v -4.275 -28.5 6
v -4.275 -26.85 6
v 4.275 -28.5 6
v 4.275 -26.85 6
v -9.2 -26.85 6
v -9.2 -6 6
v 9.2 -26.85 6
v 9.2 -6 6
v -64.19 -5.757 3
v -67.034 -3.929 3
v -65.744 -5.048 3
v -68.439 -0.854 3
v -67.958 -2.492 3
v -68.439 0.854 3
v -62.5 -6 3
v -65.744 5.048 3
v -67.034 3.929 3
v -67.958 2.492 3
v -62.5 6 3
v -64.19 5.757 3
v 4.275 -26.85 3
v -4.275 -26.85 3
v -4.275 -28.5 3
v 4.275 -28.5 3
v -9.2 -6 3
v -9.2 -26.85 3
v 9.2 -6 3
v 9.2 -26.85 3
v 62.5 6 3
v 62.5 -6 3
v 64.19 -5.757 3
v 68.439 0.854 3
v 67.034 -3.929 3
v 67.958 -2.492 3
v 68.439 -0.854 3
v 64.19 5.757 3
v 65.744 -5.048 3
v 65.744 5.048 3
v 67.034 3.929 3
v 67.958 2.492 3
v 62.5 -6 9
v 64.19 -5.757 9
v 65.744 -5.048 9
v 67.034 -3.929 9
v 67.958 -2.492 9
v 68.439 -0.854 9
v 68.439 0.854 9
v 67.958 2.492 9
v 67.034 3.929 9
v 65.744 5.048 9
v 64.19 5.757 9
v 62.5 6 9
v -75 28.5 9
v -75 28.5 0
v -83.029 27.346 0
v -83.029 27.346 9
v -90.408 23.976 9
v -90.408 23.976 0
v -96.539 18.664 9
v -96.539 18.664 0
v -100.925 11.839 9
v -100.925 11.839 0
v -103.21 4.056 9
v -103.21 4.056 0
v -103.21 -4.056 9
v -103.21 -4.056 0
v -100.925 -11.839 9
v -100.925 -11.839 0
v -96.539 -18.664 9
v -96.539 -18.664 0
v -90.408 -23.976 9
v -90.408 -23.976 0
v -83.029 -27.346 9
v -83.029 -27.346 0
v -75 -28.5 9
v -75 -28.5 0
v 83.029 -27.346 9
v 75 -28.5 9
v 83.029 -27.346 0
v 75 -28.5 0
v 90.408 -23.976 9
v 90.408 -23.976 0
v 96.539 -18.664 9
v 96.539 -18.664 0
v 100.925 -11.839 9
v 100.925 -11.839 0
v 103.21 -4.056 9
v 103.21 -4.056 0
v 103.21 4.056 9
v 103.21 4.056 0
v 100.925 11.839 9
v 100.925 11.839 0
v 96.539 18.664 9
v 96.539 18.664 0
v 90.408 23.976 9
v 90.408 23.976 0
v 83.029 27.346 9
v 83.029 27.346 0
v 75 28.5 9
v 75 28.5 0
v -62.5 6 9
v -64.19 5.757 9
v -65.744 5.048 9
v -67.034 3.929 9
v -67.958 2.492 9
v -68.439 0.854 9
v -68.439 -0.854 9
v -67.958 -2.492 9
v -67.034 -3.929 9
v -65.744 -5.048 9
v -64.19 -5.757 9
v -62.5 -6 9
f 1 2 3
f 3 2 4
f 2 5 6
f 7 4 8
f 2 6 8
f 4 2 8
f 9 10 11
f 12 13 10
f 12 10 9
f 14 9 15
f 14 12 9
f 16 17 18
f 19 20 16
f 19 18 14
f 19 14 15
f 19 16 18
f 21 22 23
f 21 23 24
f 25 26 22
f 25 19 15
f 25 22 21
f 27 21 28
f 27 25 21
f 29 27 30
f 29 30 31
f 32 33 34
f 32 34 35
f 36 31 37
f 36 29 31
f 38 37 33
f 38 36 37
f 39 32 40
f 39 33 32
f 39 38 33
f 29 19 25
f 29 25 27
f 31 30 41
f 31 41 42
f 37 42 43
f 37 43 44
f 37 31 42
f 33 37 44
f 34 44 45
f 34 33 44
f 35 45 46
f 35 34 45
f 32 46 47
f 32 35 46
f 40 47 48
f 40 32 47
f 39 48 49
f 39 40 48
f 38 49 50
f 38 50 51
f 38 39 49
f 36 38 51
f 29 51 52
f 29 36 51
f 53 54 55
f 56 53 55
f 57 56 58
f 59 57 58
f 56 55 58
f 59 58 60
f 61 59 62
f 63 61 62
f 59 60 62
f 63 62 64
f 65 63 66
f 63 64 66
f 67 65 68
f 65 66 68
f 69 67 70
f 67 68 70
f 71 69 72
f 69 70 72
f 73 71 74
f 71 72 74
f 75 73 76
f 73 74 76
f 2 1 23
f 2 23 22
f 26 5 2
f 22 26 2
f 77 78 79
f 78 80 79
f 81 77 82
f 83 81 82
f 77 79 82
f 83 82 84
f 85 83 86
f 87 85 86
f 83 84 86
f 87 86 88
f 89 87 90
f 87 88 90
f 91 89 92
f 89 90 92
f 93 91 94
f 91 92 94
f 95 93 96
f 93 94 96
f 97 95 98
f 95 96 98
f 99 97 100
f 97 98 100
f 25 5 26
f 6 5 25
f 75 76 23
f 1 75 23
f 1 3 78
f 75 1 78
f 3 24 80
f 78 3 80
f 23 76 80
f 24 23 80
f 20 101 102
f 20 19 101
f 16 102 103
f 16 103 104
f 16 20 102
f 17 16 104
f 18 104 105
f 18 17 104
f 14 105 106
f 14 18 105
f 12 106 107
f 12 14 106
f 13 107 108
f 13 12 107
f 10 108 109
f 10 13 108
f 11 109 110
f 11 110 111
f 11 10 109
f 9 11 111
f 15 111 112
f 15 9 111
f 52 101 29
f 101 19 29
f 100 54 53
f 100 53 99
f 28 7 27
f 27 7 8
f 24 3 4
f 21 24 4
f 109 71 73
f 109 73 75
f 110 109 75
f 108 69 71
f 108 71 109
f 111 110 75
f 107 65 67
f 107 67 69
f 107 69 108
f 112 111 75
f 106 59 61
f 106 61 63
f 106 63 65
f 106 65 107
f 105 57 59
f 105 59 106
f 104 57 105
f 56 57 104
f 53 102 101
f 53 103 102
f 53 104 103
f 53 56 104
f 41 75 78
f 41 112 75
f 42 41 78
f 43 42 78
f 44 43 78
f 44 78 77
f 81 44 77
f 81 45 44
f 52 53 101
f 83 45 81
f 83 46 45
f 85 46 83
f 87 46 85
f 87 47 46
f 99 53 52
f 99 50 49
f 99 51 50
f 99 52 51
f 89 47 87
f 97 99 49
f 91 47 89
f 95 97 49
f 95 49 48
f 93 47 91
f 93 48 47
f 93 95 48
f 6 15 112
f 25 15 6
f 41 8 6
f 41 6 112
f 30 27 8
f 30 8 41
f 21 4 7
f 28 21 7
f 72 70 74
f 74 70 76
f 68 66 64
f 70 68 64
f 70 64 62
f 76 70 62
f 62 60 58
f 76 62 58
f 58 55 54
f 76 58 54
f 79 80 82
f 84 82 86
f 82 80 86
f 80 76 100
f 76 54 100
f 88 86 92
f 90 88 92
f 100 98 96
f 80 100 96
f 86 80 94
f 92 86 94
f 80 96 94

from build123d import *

# Parameters (mm, degrees)
PAD_DEPTH       = 6
POCKET_DEPTH    = 3
SKETCH002_W     = 18.4
SKETCH002_H     = 20.85
POCKET001_DEPTH = 3
SKETCH003_W     = 8.55
SKETCH003_H     = 1.65
POCKET002_DEPTH = 3
PAD001_DEPTH    = 3


with BuildPart() as part:
    # Sketch → Pad (new body)
    with BuildSketch(Plane.XY):
        with BuildLine():
            ThreePointArc((-75, 28.5), (-103.5, 0), (-75, -28.5))
            Line((-75, -28.5), (75, -28.5))
            ThreePointArc((75, -28.5), (103.5, 0), (75, 28.5))
            Line((-75, 28.5), (75, 28.5))
        make_face()
    extrude(amount=PAD_DEPTH)

    # Sketch001 (on Face6 of Pad) → Pocket (cut)
    with BuildSketch(Plane.XY.offset(6)):
        with BuildLine():
            ThreePointArc((-62.5, 6), (-68.5, 0), (-62.5, -6))
            Line((-62.5, -6), (62.5, -6))
            ThreePointArc((62.5, -6), (68.5, 0), (62.5, 6))
            Line((-62.5, 6), (62.5, 6))
        make_face()
    extrude(amount=-POCKET_DEPTH, mode=Mode.SUBTRACT)

    # Sketch002 (on Face5 of Pocket) → Pocket001 (cut)
    with BuildSketch(Plane.XY.offset(6)):
        with Locations((0, -16.425)):
            Rectangle(SKETCH002_W, SKETCH002_H)
    extrude(amount=-POCKET001_DEPTH, mode=Mode.SUBTRACT)

    # Sketch003 (on Face5 of Pocket001) → Pocket002 (cut)
    with BuildSketch(Plane.XY.offset(6)):
        with Locations((0, -27.675)):
            Rectangle(SKETCH003_W, SKETCH003_H)
    extrude(amount=-POCKET002_DEPTH, mode=Mode.SUBTRACT)

    # Sketch004 (on Face5 of Pocket002) → Pad001 (join)
    with BuildSketch(Plane.XY.offset(6)):
        with BuildLine():
            ThreePointArc((-75, 28.5), (-103.5, 0), (-75, -28.5))
            Line((-75, -28.5), (75, -28.5))
            ThreePointArc((75, -28.5), (103.5, 0), (75, 28.5))
            Line((-75, 28.5), (75, 28.5))
        make_face()
        with BuildLine():
            ThreePointArc((-62.5, 6), (-68.5, 0), (-62.5, -6))
            Line((-62.5, -6), (62.5, -6))
            ThreePointArc((62.5, -6), (68.5, 0), (62.5, 6))
            Line((-62.5, 6), (62.5, 6))
        make_face(mode=Mode.SUBTRACT)
    extrude(amount=PAD001_DEPTH)


solid = part.part
